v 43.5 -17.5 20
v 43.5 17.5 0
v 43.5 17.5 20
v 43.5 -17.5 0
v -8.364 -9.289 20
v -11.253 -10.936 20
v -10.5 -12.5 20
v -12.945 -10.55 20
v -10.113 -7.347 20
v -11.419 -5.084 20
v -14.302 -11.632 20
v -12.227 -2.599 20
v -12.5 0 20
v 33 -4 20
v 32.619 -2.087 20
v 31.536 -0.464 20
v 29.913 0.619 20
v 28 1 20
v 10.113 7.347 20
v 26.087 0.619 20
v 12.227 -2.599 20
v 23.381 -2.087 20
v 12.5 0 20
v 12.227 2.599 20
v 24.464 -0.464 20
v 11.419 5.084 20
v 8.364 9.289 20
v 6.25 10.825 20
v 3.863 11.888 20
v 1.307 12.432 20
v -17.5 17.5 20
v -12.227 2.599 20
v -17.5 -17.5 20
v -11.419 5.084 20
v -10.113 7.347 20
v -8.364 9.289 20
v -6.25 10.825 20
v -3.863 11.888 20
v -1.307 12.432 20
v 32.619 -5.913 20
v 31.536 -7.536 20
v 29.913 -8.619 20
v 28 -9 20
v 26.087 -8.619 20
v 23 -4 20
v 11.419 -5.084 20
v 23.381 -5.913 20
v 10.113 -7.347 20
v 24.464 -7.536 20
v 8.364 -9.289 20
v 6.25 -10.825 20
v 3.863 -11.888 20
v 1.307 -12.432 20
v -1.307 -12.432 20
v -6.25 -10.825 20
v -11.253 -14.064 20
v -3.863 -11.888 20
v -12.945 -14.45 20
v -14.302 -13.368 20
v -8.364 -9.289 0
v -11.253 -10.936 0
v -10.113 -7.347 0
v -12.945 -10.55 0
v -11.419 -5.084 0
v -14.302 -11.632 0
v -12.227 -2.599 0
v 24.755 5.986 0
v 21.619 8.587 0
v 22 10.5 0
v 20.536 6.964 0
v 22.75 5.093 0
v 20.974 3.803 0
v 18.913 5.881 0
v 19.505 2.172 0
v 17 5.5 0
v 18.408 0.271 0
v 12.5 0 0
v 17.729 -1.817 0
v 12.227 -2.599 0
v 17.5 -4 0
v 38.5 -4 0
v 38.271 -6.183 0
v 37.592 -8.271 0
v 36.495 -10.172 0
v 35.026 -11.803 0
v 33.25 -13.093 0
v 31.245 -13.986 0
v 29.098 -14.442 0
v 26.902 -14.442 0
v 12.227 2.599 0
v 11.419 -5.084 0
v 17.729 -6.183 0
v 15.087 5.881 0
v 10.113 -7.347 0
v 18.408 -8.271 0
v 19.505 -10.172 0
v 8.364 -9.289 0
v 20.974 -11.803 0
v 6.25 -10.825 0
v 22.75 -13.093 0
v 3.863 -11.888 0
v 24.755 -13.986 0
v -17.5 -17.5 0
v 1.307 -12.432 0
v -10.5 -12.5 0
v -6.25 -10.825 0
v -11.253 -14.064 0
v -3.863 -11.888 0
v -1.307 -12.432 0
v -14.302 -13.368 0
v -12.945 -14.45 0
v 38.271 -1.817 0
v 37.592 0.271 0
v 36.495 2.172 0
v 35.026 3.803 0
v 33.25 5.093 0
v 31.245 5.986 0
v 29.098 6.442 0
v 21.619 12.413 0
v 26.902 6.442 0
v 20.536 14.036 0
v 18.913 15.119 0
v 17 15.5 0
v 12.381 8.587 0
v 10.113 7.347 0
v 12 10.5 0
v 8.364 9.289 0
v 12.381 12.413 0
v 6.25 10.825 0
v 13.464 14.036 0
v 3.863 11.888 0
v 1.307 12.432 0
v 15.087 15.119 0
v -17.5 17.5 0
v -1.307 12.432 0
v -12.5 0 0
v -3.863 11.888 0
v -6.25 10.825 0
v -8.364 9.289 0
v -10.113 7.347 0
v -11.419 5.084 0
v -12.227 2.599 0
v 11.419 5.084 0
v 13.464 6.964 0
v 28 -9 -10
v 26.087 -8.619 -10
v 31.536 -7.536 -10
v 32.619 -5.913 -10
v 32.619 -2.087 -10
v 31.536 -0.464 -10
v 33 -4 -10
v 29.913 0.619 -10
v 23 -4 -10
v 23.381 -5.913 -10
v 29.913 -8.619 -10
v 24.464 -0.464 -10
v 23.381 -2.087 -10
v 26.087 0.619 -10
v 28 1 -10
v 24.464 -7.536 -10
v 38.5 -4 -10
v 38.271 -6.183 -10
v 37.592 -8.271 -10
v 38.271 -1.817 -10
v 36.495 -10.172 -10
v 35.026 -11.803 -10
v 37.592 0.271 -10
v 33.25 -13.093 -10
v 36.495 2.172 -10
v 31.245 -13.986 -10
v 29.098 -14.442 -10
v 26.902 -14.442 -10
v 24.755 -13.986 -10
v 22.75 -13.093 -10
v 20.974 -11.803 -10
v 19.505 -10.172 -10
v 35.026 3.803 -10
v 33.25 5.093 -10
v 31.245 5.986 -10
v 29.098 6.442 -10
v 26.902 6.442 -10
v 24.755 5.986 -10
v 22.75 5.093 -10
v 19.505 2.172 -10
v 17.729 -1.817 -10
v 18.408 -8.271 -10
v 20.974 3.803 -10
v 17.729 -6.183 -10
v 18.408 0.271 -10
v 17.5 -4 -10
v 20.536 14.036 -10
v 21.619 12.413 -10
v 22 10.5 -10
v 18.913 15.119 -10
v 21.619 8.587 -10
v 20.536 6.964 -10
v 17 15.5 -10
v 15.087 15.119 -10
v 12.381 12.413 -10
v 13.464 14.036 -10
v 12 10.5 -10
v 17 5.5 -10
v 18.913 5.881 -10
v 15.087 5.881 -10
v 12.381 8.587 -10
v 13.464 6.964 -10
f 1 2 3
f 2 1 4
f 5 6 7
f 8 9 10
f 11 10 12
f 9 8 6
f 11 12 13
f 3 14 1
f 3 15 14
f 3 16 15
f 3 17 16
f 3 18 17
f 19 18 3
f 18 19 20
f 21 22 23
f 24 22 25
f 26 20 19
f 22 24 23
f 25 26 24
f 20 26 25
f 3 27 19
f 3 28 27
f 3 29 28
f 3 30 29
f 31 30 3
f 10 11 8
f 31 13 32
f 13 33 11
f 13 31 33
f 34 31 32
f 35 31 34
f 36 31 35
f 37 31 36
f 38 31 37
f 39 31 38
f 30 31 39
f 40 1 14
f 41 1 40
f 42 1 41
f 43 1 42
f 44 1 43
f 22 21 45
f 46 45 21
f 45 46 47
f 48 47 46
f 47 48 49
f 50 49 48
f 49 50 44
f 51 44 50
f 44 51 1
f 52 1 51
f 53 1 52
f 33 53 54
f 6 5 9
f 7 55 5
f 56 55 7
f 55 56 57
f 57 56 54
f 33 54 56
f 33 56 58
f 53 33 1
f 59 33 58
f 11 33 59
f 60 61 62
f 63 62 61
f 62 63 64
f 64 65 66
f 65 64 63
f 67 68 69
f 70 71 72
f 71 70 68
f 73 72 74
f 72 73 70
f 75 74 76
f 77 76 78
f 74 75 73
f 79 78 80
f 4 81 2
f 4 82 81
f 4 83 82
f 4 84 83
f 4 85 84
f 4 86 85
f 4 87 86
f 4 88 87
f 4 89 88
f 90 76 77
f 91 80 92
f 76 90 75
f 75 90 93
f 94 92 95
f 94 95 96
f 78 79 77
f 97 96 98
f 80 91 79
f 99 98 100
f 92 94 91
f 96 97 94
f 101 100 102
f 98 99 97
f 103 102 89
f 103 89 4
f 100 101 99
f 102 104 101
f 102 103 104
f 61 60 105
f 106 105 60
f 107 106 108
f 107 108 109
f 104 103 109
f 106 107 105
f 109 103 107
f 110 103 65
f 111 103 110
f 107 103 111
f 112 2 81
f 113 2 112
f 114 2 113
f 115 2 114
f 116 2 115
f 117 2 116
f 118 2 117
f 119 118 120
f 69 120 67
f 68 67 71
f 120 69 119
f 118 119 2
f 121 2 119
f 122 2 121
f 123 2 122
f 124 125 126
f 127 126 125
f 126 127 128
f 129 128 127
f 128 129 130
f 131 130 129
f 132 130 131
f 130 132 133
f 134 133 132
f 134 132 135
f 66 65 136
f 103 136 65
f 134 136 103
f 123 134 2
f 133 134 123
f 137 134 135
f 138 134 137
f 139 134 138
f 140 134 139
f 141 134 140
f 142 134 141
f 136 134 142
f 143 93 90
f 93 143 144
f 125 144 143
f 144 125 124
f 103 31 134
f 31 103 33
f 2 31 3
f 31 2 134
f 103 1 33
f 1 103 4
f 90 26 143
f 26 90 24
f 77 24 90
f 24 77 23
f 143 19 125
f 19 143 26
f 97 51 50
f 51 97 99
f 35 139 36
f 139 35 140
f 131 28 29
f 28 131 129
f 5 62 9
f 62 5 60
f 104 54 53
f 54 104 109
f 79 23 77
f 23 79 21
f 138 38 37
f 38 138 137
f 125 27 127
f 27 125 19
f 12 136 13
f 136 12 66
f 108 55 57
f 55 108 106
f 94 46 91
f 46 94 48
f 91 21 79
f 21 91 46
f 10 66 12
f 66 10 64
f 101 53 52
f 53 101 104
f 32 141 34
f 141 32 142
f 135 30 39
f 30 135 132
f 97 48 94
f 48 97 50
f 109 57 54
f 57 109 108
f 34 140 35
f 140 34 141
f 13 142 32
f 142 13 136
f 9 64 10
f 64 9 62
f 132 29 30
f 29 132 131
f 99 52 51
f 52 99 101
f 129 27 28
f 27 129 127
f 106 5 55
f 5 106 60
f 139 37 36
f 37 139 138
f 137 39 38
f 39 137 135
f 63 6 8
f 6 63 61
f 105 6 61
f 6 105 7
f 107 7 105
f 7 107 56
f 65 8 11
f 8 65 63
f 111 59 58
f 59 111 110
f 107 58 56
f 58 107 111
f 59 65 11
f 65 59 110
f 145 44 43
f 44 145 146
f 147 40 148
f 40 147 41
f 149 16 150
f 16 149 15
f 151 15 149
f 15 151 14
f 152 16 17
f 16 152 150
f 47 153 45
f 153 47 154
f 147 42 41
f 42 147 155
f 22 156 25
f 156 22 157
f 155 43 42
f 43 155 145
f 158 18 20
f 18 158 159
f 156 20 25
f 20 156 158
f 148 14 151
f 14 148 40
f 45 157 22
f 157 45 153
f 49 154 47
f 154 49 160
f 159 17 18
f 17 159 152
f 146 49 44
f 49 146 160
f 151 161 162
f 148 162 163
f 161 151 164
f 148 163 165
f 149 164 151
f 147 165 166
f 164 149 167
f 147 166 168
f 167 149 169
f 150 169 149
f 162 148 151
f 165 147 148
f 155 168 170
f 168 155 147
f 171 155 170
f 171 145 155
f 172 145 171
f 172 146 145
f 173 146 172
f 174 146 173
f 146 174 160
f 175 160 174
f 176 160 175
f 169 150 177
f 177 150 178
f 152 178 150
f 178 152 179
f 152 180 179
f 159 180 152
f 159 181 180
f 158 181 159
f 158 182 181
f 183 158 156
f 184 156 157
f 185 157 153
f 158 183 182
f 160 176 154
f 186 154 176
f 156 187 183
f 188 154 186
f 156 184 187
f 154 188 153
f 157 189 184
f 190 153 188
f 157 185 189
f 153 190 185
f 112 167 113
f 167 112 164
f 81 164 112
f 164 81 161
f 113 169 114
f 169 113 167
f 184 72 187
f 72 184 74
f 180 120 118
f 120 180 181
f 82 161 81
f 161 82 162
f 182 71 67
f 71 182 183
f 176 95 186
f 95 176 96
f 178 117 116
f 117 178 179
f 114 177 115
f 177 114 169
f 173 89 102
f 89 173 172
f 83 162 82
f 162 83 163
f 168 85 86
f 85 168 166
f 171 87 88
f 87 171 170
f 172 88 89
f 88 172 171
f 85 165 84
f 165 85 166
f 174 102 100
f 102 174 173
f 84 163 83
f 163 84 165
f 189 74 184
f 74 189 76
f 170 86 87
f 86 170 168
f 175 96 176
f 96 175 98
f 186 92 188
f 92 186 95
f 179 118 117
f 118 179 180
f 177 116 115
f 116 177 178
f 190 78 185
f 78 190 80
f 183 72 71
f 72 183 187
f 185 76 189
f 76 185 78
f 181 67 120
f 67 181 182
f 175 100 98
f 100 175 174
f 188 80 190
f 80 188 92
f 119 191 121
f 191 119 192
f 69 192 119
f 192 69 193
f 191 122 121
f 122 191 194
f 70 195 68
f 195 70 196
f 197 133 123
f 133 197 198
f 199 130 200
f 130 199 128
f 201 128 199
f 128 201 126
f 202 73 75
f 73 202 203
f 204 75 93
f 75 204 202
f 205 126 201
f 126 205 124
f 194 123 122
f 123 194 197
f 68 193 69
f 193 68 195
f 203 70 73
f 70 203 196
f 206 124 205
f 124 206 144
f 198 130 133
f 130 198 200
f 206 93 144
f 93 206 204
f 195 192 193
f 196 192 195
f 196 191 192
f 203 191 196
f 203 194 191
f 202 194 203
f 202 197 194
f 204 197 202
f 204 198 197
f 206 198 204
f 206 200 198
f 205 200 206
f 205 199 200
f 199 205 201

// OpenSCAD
// file: ../Parameters.scad
//Main tube diameter [mm]
main_tube_outer_diameter = 25;
main_tube_inner_diameter = 21;

//Tube for undercarriage [mm]
tube_for_undercarriage_outer_diameter = 10;
tube_for_undercarriage_inner_diameter = 5;

//Screw diameter in model 666_1019 [mm]
M4_screw_diameter=4;


//Screw diameter in model 666_1004 [mm]
M3_screw_diameter = 3.2;

//Nut in model 666_1004 [mm]
Nut_height = 2.4;
Nut_diameter = 6.05;
// main file
include <../Parameters.scad>
wall_thickness = main_tube_outer_diameter/5;
width = wall_thickness * 3 + main_tube_outer_diameter + main_tube_inner_diameter;
depth = main_tube_outer_diameter + wall_thickness * 2;
height = 20;
protrusion_height = 10;

difference () {

translate ([-(main_tube_outer_diameter/2+wall_thickness),-(main_tube_outer_diameter/2+wall_thickness),0])
cube ([width,depth,height]);

cylinder (h = height, r1 = main_tube_outer_diameter/2, r2 = main_tube_outer_diameter/2);

translate ([-main_tube_outer_diameter/2,-main_tube_outer_diameter/2,0])
cylinder (h = height, r1 = M4_screw_diameter/2, r2 = M4_screw_diameter/2);

translate ([main_tube_outer_diameter/2 + wall_thickness + main_tube_inner_diameter/2,-4,0])
cylinder (h = height, r1 = tube_for_undercarriage_outer_diameter/2, r2 = tube_for_undercarriage_outer_diameter/2);

}

union () {

	difference(){

	translate ([main_tube_outer_diameter/2 + wall_thickness + main_tube_inner_diameter/2,-4,-(protrusion_height)])
	cylinder (h = protrusion_height, r1 = main_tube_inner_diameter/2, r2 = main_tube_inner_diameter/2);

		translate ([main_tube_outer_diameter/2 + wall_thickness + main_tube_inner_diameter/2,-4,-protrusion_height])
		cylinder (h = protrusion_height, r1 = tube_for_undercarriage_outer_diameter/2, r2 = tube_for_undercarriage_outer_diameter/2);


}
}

union(){

	translate ([main_tube_outer_diameter/2 + wall_thickness/2+2,main_tube_outer_diameter/2 - 2,-protrusion_height])
	cylinder (h = protrusion_height, r1 = tube_for_undercarriage_inner_diameter, r2 = tube_for_undercarriage_inner_diameter);

}
